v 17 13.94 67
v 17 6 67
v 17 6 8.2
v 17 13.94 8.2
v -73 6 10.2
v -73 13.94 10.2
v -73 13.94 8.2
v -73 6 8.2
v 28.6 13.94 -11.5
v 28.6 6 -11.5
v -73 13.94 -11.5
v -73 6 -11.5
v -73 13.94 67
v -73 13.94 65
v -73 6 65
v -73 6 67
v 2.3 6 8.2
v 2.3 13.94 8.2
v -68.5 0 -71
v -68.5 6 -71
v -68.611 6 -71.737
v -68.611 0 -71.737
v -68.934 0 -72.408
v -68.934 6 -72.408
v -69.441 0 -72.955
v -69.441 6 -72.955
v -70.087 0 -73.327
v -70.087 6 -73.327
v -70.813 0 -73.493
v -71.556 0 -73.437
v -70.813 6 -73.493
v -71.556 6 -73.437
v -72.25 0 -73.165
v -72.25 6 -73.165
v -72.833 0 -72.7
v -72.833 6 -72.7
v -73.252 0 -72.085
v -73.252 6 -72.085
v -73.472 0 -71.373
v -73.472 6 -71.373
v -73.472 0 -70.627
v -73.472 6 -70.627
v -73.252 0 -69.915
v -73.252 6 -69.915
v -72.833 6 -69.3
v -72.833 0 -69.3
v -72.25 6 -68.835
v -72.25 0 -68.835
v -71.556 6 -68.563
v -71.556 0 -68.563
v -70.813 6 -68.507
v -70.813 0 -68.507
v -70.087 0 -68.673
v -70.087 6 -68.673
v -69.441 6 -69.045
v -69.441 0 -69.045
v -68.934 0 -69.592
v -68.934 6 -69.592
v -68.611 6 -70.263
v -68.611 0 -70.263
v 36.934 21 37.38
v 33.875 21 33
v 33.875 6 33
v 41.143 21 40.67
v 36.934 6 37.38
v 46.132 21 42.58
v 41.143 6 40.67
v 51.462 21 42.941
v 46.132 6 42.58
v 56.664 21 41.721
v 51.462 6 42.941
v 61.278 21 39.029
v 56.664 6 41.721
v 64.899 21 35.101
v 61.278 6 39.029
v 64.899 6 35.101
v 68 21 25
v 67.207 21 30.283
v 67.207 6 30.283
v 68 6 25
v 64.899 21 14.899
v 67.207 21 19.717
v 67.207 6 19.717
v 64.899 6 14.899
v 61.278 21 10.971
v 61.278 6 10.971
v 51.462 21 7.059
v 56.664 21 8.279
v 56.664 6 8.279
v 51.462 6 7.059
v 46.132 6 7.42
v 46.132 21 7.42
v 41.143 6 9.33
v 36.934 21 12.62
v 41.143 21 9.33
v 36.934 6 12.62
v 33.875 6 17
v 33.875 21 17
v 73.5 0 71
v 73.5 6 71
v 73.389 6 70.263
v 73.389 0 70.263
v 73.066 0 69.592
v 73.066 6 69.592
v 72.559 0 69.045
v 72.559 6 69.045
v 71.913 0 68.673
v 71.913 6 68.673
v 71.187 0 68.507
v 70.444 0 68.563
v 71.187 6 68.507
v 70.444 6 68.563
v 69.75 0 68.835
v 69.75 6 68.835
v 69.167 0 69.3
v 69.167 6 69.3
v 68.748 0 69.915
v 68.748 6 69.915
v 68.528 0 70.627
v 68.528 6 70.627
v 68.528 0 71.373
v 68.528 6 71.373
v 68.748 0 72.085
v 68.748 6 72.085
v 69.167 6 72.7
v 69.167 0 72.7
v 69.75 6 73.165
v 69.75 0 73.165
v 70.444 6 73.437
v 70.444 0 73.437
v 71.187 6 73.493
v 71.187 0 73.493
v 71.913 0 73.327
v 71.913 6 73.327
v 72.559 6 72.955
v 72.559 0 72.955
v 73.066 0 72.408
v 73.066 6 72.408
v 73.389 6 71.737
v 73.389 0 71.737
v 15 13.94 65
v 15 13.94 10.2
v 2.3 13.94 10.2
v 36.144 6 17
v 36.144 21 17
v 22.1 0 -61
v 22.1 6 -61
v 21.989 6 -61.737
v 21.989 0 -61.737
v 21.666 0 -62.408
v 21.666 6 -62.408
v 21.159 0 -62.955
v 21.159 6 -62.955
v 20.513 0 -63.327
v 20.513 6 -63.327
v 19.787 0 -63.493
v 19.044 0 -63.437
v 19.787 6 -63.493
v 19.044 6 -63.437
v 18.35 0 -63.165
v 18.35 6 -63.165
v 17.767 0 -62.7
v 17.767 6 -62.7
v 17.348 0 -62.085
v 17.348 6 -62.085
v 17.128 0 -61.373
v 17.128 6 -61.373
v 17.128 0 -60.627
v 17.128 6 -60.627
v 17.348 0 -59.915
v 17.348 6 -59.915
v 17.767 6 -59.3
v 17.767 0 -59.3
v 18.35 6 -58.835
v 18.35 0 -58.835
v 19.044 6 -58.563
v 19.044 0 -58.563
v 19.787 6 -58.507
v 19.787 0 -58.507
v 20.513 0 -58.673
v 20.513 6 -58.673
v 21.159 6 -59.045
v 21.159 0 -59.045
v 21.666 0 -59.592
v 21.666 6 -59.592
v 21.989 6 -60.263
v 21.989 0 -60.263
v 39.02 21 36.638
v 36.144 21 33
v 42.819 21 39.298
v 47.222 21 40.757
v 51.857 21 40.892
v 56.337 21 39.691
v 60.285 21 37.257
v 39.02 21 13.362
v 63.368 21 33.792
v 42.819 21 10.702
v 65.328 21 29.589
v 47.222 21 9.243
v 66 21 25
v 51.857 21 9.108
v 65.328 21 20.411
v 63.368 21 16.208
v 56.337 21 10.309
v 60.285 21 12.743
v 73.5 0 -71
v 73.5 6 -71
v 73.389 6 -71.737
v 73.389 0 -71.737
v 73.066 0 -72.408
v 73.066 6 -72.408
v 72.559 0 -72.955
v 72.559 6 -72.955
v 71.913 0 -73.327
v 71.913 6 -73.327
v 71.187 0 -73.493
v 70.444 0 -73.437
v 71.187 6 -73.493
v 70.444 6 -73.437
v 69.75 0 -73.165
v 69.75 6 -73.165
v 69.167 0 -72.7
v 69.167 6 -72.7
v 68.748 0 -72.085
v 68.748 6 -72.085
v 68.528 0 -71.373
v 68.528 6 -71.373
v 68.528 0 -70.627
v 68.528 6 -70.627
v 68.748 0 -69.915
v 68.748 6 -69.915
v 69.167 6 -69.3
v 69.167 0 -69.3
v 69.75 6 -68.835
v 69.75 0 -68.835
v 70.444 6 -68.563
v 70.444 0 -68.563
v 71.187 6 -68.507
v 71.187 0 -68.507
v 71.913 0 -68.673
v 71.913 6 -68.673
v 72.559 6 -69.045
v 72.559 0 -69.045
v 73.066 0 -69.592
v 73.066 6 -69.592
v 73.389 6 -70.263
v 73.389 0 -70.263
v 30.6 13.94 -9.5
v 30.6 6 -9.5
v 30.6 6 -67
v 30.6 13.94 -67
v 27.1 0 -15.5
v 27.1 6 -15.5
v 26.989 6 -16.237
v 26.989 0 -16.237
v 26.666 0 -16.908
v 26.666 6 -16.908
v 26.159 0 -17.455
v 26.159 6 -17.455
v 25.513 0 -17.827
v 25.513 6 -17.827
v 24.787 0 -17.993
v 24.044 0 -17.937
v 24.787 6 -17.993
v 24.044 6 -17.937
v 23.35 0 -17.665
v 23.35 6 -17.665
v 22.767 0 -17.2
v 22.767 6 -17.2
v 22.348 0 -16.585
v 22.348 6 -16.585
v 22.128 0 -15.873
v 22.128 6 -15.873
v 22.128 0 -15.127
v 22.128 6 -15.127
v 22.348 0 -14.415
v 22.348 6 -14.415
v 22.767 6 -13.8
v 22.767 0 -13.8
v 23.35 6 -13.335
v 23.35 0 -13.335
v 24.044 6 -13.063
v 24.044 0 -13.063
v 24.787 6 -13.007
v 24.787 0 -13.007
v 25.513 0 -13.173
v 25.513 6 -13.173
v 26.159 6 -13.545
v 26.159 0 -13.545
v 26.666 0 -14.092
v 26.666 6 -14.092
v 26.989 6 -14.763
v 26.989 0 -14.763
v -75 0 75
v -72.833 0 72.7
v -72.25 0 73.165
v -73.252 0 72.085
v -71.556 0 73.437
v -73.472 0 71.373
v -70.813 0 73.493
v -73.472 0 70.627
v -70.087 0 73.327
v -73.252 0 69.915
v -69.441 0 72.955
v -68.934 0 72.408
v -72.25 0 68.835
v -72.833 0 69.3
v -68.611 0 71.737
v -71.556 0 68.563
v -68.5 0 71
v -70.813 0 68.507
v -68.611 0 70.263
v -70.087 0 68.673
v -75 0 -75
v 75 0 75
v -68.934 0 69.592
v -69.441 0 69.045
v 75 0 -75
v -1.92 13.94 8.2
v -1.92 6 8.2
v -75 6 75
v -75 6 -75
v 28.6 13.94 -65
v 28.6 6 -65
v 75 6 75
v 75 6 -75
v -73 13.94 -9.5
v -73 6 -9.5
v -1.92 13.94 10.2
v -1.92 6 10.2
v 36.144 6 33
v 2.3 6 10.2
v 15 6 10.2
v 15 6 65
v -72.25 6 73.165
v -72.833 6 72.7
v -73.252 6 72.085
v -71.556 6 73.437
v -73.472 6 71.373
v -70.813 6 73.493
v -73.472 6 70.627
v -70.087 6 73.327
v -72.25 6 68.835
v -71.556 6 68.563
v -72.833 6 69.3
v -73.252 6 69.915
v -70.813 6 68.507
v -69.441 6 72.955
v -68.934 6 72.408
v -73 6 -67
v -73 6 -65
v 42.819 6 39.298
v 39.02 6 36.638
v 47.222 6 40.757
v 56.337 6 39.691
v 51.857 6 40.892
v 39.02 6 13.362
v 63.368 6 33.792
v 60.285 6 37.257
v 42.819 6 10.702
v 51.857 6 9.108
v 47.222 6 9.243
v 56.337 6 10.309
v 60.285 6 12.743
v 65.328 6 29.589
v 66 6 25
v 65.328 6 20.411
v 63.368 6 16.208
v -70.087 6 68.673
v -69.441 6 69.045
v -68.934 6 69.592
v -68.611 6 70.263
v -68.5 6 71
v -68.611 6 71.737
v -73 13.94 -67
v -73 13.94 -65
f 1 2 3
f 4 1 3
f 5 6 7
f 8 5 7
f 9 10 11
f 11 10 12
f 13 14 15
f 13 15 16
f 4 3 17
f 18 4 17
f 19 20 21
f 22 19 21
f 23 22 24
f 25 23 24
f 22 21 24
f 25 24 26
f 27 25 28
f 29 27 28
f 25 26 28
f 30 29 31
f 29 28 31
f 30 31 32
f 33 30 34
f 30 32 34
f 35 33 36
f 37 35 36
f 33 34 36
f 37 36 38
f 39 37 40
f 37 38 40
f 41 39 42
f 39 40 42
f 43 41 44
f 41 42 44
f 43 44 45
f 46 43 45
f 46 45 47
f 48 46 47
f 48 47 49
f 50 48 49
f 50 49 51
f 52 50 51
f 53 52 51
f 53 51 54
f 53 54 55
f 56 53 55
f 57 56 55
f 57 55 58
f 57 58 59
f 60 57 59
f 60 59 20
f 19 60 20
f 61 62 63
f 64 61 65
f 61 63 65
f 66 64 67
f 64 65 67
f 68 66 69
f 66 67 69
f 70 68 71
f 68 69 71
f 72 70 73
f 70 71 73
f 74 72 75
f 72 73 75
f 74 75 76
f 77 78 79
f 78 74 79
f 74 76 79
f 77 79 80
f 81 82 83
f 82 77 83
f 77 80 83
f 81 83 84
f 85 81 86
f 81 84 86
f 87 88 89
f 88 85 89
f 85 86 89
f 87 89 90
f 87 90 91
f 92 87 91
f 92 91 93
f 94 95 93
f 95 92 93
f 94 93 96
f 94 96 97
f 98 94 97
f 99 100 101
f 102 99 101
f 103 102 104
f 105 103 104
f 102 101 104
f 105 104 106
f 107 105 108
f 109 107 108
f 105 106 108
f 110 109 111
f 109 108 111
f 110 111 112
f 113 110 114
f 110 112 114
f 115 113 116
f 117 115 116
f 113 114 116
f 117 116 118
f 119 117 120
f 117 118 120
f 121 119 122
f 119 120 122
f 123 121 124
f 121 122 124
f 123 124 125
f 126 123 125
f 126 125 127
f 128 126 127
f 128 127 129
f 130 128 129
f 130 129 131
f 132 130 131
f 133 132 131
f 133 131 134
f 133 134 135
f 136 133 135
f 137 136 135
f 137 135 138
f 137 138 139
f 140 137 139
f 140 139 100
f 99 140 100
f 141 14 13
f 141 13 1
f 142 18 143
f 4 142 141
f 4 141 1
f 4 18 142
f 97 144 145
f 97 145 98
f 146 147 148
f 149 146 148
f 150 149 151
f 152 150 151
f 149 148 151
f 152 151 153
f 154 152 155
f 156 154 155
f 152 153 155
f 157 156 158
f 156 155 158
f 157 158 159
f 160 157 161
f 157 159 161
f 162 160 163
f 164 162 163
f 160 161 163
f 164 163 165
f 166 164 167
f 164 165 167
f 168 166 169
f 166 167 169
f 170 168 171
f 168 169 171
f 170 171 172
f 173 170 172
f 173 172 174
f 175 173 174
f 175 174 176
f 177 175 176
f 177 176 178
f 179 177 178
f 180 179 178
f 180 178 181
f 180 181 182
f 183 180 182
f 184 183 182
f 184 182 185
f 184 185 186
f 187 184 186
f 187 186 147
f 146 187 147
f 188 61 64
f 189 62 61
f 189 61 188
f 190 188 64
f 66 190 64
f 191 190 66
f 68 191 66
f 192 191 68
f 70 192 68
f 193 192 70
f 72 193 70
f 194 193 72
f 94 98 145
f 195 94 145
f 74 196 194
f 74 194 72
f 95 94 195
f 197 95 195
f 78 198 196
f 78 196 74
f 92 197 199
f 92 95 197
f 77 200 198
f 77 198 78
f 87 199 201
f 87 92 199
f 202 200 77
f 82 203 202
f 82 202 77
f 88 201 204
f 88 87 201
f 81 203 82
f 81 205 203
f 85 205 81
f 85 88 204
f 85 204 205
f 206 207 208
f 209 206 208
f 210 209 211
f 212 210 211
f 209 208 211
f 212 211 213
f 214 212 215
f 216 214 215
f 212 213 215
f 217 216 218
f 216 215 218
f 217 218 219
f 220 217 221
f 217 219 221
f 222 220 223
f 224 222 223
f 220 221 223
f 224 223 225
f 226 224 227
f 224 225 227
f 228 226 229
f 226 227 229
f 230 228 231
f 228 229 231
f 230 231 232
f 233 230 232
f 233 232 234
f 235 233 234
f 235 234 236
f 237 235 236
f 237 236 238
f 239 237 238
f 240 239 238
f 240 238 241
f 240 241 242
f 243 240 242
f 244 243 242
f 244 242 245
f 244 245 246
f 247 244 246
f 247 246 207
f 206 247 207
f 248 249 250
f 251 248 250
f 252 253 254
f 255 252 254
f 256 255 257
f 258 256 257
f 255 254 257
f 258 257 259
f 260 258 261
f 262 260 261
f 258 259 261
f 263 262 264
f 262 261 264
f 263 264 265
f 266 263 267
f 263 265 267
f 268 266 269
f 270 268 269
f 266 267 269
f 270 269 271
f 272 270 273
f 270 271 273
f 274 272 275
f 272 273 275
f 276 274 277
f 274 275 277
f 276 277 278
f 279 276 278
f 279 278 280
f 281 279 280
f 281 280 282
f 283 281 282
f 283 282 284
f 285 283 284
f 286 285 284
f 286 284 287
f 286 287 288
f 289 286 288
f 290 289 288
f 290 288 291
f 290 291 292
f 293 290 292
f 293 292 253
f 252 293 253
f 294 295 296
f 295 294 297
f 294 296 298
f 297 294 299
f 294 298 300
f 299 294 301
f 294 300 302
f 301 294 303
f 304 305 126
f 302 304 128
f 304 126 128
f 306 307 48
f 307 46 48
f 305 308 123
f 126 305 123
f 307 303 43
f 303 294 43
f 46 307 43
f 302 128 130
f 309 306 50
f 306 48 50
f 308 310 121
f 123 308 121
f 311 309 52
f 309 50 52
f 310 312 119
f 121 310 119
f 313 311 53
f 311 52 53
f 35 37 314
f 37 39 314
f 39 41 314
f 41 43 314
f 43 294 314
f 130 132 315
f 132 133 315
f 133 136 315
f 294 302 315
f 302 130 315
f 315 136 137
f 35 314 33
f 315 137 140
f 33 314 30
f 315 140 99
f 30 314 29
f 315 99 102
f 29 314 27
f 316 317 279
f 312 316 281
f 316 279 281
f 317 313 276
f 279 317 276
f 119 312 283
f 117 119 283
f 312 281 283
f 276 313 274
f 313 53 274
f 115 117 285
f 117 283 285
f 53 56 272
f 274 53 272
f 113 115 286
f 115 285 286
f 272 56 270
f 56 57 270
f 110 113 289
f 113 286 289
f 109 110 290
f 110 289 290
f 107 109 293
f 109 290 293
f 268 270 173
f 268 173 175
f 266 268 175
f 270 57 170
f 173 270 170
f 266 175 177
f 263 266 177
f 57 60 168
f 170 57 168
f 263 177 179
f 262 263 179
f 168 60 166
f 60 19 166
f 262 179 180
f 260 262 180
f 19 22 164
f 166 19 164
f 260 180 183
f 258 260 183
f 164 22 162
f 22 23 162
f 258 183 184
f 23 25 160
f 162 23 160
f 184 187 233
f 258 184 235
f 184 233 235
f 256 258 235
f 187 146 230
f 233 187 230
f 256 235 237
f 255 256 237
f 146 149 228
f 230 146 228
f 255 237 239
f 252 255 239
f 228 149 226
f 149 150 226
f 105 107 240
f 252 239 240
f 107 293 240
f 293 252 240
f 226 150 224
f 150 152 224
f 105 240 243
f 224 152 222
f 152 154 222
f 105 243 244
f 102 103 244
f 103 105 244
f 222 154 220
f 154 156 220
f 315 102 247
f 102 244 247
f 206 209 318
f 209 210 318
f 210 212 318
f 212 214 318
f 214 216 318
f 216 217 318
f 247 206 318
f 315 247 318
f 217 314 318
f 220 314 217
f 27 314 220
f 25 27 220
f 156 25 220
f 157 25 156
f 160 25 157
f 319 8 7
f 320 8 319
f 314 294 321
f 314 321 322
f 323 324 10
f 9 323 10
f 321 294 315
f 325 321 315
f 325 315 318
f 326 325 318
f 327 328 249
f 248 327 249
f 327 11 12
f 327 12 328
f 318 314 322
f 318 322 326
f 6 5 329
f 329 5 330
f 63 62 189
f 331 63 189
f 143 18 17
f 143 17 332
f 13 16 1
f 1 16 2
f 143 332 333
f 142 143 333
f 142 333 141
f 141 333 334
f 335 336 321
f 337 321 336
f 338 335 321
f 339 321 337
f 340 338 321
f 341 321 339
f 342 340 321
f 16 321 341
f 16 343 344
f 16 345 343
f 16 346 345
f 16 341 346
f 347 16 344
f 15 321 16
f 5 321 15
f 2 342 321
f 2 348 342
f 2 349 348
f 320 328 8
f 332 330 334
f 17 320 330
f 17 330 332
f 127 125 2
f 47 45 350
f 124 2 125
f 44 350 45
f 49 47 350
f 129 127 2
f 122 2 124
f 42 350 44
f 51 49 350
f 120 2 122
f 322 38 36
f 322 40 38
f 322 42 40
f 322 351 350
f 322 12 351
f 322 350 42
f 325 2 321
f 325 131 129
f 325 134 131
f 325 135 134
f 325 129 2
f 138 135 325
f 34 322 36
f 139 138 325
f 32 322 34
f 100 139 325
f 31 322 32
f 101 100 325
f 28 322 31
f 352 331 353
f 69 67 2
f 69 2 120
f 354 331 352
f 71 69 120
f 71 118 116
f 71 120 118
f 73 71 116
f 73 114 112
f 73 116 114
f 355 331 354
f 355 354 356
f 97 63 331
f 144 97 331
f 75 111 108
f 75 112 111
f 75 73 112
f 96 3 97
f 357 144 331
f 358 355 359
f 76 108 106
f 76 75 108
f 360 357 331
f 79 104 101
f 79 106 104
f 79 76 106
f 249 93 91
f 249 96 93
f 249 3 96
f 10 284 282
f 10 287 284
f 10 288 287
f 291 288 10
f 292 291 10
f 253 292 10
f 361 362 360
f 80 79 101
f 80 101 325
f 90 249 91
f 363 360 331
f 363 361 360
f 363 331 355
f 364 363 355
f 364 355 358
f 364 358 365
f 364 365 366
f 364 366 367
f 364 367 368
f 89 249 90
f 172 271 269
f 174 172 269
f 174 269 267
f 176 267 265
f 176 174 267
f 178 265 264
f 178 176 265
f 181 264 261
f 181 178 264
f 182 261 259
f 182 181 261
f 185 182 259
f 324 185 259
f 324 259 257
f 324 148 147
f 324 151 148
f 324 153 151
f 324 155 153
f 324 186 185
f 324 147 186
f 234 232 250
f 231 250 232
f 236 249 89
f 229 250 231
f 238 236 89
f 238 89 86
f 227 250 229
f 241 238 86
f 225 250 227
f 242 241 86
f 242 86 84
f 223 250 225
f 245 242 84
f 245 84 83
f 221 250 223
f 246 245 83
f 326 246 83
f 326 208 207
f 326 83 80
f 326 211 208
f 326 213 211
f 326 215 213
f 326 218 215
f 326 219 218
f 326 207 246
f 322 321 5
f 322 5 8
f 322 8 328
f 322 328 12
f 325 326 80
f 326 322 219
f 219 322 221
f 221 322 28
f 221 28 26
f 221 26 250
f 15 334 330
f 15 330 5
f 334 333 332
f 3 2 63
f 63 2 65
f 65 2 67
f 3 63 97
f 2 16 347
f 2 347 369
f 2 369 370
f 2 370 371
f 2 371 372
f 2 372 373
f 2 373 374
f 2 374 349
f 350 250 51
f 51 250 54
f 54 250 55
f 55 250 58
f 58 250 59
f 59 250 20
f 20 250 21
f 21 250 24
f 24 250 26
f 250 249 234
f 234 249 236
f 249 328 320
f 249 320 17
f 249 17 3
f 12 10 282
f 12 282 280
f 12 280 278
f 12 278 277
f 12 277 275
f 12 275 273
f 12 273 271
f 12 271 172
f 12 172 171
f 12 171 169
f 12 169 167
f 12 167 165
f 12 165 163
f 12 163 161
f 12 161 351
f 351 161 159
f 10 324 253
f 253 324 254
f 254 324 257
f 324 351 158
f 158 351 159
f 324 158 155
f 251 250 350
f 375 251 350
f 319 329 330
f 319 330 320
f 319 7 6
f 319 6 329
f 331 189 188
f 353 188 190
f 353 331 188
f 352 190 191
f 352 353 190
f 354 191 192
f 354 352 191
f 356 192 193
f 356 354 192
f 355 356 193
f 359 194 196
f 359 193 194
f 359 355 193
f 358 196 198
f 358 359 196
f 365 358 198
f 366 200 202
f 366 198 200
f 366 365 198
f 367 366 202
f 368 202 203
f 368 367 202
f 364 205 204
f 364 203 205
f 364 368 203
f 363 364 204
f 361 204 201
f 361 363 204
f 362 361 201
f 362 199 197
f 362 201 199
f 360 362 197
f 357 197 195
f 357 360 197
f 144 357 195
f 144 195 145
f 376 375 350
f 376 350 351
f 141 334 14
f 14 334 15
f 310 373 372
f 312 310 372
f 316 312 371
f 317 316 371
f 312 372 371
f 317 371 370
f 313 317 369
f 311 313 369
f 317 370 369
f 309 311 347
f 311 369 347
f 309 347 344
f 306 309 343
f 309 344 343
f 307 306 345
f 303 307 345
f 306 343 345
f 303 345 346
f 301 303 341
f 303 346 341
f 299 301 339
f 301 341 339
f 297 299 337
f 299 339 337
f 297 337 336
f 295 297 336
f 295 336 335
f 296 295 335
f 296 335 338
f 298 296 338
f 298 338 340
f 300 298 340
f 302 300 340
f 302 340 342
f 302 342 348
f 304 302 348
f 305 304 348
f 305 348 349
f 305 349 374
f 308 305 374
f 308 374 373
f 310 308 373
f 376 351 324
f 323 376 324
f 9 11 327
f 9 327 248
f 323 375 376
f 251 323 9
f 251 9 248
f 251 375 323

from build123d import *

# Parameters (mm, degrees)
SKETCH1_W           = 150
SKETCH1_H           = 150
BOSS_EXTRUDE1_DEPTH = 6
SKETCH2_W           = 71.08
SKETCH2_H           = 2
SKETCH2_R           = 18
SKETCH2_R_2         = 16
BOSS_EXTRUDE2_DEPTH = 7.94
SKETCH3_R           = 18
SKETCH3_R_2         = 16
BOSS_EXTRUDE3_DEPTH = 7.06
SKETCH5_R           = 2.5
CUT_EXTRUDE1_DEPTH  = 7
CUT_EXTRUDE2_DEPTH  = 15


with BuildPart() as part:
    # Sketch1 → Boss-Extrude1 (new body)
    with BuildSketch(Plane(origin=(0, 0, 0), x_dir=(1, 0, 0), z_dir=(0, 1, 0))):
        Rectangle(SKETCH1_W, SKETCH1_H)
    extrude(amount=BOSS_EXTRUDE1_DEPTH)

    # Sketch2 → Boss-Extrude2 (add)
    with BuildSketch(Plane(origin=(0, 6, 0), x_dir=(1, 0, 0), z_dir=(0, 1, 0))):
        Polygon((30.6, 67), (-73, 67), (-73, 65), (28.6, 65), (28.6, 11.5), (-73, 11.5), (-73, 9.5), (30.6, 9.5), align=None)
        with Locations((-37.46, -9.2)):
            Rectangle(SKETCH2_W, SKETCH2_H)
        Polygon((-73, -65), (-73, -67), (17, -67), (17, -8.2), (2.3, -8.2), (2.3, -10.2), (15, -10.2), (15, -65), align=None)
        with Locations((50, -25)):
            Circle(SKETCH2_R)
        with Locations((50, -25)):
            Circle(SKETCH2_R_2, mode=Mode.SUBTRACT)
    extrude(amount=BOSS_EXTRUDE2_DEPTH)

    # Sketch3 → Boss-Extrude3 (add)
    with BuildSketch(Plane(origin=(0, 13.94, 0), x_dir=(1, 0, 0), z_dir=(0, 1, 0))):
        with Locations((50, -25)):
            Circle(SKETCH3_R)
        with Locations((50, -25)):
            Circle(SKETCH3_R_2, mode=Mode.SUBTRACT)
    extrude(amount=BOSS_EXTRUDE3_DEPTH)

    # Sketch5 → Cut-Extrude1 (cut, through all)
    with BuildSketch(Plane(origin=(0, 6, 0), x_dir=(1, 0, 0), z_dir=(0, 1, 0))):
        with Locations((-71, 71)):
            Circle(SKETCH5_R)
        with Locations((19.6, 61)):
            Circle(SKETCH5_R)
        with Locations((24.6, 15.5)):
            Circle(SKETCH5_R)
        with Locations((71, 71)):
            Circle(SKETCH5_R)
        with Locations((71, -71)):
            Circle(SKETCH5_R)
        with Locations((-71, -71)):
            Circle(SKETCH5_R)
    extrude(amount=-CUT_EXTRUDE1_DEPTH, mode=Mode.SUBTRACT)

    # Sketch6 → Cut-Extrude2 (cut)
    with BuildSketch(Plane(origin=(0, 21, 0), x_dir=(1, 0, 0), z_dir=(0, 1, 0))):
        with BuildLine():
            Line((33.875484503, -33), (33.875484503, -17))
            ThreePointArc((33.875484503, -17), (32, -25), (33.875484503, -33))
        make_face()
        with BuildLine():
            ThreePointArc((36.143593539, -33), (34, -25), (36.143593539, -17))
            Line((36.143593539, -17), (33.875484503, -17))
            Line((33.875484503, -17), (33.875484503, -33))
            Line((33.875484503, -33), (36.143593539, -33))
        make_face()
    extrude(amount=-CUT_EXTRUDE2_DEPTH, mode=Mode.SUBTRACT)


solid = part.part
